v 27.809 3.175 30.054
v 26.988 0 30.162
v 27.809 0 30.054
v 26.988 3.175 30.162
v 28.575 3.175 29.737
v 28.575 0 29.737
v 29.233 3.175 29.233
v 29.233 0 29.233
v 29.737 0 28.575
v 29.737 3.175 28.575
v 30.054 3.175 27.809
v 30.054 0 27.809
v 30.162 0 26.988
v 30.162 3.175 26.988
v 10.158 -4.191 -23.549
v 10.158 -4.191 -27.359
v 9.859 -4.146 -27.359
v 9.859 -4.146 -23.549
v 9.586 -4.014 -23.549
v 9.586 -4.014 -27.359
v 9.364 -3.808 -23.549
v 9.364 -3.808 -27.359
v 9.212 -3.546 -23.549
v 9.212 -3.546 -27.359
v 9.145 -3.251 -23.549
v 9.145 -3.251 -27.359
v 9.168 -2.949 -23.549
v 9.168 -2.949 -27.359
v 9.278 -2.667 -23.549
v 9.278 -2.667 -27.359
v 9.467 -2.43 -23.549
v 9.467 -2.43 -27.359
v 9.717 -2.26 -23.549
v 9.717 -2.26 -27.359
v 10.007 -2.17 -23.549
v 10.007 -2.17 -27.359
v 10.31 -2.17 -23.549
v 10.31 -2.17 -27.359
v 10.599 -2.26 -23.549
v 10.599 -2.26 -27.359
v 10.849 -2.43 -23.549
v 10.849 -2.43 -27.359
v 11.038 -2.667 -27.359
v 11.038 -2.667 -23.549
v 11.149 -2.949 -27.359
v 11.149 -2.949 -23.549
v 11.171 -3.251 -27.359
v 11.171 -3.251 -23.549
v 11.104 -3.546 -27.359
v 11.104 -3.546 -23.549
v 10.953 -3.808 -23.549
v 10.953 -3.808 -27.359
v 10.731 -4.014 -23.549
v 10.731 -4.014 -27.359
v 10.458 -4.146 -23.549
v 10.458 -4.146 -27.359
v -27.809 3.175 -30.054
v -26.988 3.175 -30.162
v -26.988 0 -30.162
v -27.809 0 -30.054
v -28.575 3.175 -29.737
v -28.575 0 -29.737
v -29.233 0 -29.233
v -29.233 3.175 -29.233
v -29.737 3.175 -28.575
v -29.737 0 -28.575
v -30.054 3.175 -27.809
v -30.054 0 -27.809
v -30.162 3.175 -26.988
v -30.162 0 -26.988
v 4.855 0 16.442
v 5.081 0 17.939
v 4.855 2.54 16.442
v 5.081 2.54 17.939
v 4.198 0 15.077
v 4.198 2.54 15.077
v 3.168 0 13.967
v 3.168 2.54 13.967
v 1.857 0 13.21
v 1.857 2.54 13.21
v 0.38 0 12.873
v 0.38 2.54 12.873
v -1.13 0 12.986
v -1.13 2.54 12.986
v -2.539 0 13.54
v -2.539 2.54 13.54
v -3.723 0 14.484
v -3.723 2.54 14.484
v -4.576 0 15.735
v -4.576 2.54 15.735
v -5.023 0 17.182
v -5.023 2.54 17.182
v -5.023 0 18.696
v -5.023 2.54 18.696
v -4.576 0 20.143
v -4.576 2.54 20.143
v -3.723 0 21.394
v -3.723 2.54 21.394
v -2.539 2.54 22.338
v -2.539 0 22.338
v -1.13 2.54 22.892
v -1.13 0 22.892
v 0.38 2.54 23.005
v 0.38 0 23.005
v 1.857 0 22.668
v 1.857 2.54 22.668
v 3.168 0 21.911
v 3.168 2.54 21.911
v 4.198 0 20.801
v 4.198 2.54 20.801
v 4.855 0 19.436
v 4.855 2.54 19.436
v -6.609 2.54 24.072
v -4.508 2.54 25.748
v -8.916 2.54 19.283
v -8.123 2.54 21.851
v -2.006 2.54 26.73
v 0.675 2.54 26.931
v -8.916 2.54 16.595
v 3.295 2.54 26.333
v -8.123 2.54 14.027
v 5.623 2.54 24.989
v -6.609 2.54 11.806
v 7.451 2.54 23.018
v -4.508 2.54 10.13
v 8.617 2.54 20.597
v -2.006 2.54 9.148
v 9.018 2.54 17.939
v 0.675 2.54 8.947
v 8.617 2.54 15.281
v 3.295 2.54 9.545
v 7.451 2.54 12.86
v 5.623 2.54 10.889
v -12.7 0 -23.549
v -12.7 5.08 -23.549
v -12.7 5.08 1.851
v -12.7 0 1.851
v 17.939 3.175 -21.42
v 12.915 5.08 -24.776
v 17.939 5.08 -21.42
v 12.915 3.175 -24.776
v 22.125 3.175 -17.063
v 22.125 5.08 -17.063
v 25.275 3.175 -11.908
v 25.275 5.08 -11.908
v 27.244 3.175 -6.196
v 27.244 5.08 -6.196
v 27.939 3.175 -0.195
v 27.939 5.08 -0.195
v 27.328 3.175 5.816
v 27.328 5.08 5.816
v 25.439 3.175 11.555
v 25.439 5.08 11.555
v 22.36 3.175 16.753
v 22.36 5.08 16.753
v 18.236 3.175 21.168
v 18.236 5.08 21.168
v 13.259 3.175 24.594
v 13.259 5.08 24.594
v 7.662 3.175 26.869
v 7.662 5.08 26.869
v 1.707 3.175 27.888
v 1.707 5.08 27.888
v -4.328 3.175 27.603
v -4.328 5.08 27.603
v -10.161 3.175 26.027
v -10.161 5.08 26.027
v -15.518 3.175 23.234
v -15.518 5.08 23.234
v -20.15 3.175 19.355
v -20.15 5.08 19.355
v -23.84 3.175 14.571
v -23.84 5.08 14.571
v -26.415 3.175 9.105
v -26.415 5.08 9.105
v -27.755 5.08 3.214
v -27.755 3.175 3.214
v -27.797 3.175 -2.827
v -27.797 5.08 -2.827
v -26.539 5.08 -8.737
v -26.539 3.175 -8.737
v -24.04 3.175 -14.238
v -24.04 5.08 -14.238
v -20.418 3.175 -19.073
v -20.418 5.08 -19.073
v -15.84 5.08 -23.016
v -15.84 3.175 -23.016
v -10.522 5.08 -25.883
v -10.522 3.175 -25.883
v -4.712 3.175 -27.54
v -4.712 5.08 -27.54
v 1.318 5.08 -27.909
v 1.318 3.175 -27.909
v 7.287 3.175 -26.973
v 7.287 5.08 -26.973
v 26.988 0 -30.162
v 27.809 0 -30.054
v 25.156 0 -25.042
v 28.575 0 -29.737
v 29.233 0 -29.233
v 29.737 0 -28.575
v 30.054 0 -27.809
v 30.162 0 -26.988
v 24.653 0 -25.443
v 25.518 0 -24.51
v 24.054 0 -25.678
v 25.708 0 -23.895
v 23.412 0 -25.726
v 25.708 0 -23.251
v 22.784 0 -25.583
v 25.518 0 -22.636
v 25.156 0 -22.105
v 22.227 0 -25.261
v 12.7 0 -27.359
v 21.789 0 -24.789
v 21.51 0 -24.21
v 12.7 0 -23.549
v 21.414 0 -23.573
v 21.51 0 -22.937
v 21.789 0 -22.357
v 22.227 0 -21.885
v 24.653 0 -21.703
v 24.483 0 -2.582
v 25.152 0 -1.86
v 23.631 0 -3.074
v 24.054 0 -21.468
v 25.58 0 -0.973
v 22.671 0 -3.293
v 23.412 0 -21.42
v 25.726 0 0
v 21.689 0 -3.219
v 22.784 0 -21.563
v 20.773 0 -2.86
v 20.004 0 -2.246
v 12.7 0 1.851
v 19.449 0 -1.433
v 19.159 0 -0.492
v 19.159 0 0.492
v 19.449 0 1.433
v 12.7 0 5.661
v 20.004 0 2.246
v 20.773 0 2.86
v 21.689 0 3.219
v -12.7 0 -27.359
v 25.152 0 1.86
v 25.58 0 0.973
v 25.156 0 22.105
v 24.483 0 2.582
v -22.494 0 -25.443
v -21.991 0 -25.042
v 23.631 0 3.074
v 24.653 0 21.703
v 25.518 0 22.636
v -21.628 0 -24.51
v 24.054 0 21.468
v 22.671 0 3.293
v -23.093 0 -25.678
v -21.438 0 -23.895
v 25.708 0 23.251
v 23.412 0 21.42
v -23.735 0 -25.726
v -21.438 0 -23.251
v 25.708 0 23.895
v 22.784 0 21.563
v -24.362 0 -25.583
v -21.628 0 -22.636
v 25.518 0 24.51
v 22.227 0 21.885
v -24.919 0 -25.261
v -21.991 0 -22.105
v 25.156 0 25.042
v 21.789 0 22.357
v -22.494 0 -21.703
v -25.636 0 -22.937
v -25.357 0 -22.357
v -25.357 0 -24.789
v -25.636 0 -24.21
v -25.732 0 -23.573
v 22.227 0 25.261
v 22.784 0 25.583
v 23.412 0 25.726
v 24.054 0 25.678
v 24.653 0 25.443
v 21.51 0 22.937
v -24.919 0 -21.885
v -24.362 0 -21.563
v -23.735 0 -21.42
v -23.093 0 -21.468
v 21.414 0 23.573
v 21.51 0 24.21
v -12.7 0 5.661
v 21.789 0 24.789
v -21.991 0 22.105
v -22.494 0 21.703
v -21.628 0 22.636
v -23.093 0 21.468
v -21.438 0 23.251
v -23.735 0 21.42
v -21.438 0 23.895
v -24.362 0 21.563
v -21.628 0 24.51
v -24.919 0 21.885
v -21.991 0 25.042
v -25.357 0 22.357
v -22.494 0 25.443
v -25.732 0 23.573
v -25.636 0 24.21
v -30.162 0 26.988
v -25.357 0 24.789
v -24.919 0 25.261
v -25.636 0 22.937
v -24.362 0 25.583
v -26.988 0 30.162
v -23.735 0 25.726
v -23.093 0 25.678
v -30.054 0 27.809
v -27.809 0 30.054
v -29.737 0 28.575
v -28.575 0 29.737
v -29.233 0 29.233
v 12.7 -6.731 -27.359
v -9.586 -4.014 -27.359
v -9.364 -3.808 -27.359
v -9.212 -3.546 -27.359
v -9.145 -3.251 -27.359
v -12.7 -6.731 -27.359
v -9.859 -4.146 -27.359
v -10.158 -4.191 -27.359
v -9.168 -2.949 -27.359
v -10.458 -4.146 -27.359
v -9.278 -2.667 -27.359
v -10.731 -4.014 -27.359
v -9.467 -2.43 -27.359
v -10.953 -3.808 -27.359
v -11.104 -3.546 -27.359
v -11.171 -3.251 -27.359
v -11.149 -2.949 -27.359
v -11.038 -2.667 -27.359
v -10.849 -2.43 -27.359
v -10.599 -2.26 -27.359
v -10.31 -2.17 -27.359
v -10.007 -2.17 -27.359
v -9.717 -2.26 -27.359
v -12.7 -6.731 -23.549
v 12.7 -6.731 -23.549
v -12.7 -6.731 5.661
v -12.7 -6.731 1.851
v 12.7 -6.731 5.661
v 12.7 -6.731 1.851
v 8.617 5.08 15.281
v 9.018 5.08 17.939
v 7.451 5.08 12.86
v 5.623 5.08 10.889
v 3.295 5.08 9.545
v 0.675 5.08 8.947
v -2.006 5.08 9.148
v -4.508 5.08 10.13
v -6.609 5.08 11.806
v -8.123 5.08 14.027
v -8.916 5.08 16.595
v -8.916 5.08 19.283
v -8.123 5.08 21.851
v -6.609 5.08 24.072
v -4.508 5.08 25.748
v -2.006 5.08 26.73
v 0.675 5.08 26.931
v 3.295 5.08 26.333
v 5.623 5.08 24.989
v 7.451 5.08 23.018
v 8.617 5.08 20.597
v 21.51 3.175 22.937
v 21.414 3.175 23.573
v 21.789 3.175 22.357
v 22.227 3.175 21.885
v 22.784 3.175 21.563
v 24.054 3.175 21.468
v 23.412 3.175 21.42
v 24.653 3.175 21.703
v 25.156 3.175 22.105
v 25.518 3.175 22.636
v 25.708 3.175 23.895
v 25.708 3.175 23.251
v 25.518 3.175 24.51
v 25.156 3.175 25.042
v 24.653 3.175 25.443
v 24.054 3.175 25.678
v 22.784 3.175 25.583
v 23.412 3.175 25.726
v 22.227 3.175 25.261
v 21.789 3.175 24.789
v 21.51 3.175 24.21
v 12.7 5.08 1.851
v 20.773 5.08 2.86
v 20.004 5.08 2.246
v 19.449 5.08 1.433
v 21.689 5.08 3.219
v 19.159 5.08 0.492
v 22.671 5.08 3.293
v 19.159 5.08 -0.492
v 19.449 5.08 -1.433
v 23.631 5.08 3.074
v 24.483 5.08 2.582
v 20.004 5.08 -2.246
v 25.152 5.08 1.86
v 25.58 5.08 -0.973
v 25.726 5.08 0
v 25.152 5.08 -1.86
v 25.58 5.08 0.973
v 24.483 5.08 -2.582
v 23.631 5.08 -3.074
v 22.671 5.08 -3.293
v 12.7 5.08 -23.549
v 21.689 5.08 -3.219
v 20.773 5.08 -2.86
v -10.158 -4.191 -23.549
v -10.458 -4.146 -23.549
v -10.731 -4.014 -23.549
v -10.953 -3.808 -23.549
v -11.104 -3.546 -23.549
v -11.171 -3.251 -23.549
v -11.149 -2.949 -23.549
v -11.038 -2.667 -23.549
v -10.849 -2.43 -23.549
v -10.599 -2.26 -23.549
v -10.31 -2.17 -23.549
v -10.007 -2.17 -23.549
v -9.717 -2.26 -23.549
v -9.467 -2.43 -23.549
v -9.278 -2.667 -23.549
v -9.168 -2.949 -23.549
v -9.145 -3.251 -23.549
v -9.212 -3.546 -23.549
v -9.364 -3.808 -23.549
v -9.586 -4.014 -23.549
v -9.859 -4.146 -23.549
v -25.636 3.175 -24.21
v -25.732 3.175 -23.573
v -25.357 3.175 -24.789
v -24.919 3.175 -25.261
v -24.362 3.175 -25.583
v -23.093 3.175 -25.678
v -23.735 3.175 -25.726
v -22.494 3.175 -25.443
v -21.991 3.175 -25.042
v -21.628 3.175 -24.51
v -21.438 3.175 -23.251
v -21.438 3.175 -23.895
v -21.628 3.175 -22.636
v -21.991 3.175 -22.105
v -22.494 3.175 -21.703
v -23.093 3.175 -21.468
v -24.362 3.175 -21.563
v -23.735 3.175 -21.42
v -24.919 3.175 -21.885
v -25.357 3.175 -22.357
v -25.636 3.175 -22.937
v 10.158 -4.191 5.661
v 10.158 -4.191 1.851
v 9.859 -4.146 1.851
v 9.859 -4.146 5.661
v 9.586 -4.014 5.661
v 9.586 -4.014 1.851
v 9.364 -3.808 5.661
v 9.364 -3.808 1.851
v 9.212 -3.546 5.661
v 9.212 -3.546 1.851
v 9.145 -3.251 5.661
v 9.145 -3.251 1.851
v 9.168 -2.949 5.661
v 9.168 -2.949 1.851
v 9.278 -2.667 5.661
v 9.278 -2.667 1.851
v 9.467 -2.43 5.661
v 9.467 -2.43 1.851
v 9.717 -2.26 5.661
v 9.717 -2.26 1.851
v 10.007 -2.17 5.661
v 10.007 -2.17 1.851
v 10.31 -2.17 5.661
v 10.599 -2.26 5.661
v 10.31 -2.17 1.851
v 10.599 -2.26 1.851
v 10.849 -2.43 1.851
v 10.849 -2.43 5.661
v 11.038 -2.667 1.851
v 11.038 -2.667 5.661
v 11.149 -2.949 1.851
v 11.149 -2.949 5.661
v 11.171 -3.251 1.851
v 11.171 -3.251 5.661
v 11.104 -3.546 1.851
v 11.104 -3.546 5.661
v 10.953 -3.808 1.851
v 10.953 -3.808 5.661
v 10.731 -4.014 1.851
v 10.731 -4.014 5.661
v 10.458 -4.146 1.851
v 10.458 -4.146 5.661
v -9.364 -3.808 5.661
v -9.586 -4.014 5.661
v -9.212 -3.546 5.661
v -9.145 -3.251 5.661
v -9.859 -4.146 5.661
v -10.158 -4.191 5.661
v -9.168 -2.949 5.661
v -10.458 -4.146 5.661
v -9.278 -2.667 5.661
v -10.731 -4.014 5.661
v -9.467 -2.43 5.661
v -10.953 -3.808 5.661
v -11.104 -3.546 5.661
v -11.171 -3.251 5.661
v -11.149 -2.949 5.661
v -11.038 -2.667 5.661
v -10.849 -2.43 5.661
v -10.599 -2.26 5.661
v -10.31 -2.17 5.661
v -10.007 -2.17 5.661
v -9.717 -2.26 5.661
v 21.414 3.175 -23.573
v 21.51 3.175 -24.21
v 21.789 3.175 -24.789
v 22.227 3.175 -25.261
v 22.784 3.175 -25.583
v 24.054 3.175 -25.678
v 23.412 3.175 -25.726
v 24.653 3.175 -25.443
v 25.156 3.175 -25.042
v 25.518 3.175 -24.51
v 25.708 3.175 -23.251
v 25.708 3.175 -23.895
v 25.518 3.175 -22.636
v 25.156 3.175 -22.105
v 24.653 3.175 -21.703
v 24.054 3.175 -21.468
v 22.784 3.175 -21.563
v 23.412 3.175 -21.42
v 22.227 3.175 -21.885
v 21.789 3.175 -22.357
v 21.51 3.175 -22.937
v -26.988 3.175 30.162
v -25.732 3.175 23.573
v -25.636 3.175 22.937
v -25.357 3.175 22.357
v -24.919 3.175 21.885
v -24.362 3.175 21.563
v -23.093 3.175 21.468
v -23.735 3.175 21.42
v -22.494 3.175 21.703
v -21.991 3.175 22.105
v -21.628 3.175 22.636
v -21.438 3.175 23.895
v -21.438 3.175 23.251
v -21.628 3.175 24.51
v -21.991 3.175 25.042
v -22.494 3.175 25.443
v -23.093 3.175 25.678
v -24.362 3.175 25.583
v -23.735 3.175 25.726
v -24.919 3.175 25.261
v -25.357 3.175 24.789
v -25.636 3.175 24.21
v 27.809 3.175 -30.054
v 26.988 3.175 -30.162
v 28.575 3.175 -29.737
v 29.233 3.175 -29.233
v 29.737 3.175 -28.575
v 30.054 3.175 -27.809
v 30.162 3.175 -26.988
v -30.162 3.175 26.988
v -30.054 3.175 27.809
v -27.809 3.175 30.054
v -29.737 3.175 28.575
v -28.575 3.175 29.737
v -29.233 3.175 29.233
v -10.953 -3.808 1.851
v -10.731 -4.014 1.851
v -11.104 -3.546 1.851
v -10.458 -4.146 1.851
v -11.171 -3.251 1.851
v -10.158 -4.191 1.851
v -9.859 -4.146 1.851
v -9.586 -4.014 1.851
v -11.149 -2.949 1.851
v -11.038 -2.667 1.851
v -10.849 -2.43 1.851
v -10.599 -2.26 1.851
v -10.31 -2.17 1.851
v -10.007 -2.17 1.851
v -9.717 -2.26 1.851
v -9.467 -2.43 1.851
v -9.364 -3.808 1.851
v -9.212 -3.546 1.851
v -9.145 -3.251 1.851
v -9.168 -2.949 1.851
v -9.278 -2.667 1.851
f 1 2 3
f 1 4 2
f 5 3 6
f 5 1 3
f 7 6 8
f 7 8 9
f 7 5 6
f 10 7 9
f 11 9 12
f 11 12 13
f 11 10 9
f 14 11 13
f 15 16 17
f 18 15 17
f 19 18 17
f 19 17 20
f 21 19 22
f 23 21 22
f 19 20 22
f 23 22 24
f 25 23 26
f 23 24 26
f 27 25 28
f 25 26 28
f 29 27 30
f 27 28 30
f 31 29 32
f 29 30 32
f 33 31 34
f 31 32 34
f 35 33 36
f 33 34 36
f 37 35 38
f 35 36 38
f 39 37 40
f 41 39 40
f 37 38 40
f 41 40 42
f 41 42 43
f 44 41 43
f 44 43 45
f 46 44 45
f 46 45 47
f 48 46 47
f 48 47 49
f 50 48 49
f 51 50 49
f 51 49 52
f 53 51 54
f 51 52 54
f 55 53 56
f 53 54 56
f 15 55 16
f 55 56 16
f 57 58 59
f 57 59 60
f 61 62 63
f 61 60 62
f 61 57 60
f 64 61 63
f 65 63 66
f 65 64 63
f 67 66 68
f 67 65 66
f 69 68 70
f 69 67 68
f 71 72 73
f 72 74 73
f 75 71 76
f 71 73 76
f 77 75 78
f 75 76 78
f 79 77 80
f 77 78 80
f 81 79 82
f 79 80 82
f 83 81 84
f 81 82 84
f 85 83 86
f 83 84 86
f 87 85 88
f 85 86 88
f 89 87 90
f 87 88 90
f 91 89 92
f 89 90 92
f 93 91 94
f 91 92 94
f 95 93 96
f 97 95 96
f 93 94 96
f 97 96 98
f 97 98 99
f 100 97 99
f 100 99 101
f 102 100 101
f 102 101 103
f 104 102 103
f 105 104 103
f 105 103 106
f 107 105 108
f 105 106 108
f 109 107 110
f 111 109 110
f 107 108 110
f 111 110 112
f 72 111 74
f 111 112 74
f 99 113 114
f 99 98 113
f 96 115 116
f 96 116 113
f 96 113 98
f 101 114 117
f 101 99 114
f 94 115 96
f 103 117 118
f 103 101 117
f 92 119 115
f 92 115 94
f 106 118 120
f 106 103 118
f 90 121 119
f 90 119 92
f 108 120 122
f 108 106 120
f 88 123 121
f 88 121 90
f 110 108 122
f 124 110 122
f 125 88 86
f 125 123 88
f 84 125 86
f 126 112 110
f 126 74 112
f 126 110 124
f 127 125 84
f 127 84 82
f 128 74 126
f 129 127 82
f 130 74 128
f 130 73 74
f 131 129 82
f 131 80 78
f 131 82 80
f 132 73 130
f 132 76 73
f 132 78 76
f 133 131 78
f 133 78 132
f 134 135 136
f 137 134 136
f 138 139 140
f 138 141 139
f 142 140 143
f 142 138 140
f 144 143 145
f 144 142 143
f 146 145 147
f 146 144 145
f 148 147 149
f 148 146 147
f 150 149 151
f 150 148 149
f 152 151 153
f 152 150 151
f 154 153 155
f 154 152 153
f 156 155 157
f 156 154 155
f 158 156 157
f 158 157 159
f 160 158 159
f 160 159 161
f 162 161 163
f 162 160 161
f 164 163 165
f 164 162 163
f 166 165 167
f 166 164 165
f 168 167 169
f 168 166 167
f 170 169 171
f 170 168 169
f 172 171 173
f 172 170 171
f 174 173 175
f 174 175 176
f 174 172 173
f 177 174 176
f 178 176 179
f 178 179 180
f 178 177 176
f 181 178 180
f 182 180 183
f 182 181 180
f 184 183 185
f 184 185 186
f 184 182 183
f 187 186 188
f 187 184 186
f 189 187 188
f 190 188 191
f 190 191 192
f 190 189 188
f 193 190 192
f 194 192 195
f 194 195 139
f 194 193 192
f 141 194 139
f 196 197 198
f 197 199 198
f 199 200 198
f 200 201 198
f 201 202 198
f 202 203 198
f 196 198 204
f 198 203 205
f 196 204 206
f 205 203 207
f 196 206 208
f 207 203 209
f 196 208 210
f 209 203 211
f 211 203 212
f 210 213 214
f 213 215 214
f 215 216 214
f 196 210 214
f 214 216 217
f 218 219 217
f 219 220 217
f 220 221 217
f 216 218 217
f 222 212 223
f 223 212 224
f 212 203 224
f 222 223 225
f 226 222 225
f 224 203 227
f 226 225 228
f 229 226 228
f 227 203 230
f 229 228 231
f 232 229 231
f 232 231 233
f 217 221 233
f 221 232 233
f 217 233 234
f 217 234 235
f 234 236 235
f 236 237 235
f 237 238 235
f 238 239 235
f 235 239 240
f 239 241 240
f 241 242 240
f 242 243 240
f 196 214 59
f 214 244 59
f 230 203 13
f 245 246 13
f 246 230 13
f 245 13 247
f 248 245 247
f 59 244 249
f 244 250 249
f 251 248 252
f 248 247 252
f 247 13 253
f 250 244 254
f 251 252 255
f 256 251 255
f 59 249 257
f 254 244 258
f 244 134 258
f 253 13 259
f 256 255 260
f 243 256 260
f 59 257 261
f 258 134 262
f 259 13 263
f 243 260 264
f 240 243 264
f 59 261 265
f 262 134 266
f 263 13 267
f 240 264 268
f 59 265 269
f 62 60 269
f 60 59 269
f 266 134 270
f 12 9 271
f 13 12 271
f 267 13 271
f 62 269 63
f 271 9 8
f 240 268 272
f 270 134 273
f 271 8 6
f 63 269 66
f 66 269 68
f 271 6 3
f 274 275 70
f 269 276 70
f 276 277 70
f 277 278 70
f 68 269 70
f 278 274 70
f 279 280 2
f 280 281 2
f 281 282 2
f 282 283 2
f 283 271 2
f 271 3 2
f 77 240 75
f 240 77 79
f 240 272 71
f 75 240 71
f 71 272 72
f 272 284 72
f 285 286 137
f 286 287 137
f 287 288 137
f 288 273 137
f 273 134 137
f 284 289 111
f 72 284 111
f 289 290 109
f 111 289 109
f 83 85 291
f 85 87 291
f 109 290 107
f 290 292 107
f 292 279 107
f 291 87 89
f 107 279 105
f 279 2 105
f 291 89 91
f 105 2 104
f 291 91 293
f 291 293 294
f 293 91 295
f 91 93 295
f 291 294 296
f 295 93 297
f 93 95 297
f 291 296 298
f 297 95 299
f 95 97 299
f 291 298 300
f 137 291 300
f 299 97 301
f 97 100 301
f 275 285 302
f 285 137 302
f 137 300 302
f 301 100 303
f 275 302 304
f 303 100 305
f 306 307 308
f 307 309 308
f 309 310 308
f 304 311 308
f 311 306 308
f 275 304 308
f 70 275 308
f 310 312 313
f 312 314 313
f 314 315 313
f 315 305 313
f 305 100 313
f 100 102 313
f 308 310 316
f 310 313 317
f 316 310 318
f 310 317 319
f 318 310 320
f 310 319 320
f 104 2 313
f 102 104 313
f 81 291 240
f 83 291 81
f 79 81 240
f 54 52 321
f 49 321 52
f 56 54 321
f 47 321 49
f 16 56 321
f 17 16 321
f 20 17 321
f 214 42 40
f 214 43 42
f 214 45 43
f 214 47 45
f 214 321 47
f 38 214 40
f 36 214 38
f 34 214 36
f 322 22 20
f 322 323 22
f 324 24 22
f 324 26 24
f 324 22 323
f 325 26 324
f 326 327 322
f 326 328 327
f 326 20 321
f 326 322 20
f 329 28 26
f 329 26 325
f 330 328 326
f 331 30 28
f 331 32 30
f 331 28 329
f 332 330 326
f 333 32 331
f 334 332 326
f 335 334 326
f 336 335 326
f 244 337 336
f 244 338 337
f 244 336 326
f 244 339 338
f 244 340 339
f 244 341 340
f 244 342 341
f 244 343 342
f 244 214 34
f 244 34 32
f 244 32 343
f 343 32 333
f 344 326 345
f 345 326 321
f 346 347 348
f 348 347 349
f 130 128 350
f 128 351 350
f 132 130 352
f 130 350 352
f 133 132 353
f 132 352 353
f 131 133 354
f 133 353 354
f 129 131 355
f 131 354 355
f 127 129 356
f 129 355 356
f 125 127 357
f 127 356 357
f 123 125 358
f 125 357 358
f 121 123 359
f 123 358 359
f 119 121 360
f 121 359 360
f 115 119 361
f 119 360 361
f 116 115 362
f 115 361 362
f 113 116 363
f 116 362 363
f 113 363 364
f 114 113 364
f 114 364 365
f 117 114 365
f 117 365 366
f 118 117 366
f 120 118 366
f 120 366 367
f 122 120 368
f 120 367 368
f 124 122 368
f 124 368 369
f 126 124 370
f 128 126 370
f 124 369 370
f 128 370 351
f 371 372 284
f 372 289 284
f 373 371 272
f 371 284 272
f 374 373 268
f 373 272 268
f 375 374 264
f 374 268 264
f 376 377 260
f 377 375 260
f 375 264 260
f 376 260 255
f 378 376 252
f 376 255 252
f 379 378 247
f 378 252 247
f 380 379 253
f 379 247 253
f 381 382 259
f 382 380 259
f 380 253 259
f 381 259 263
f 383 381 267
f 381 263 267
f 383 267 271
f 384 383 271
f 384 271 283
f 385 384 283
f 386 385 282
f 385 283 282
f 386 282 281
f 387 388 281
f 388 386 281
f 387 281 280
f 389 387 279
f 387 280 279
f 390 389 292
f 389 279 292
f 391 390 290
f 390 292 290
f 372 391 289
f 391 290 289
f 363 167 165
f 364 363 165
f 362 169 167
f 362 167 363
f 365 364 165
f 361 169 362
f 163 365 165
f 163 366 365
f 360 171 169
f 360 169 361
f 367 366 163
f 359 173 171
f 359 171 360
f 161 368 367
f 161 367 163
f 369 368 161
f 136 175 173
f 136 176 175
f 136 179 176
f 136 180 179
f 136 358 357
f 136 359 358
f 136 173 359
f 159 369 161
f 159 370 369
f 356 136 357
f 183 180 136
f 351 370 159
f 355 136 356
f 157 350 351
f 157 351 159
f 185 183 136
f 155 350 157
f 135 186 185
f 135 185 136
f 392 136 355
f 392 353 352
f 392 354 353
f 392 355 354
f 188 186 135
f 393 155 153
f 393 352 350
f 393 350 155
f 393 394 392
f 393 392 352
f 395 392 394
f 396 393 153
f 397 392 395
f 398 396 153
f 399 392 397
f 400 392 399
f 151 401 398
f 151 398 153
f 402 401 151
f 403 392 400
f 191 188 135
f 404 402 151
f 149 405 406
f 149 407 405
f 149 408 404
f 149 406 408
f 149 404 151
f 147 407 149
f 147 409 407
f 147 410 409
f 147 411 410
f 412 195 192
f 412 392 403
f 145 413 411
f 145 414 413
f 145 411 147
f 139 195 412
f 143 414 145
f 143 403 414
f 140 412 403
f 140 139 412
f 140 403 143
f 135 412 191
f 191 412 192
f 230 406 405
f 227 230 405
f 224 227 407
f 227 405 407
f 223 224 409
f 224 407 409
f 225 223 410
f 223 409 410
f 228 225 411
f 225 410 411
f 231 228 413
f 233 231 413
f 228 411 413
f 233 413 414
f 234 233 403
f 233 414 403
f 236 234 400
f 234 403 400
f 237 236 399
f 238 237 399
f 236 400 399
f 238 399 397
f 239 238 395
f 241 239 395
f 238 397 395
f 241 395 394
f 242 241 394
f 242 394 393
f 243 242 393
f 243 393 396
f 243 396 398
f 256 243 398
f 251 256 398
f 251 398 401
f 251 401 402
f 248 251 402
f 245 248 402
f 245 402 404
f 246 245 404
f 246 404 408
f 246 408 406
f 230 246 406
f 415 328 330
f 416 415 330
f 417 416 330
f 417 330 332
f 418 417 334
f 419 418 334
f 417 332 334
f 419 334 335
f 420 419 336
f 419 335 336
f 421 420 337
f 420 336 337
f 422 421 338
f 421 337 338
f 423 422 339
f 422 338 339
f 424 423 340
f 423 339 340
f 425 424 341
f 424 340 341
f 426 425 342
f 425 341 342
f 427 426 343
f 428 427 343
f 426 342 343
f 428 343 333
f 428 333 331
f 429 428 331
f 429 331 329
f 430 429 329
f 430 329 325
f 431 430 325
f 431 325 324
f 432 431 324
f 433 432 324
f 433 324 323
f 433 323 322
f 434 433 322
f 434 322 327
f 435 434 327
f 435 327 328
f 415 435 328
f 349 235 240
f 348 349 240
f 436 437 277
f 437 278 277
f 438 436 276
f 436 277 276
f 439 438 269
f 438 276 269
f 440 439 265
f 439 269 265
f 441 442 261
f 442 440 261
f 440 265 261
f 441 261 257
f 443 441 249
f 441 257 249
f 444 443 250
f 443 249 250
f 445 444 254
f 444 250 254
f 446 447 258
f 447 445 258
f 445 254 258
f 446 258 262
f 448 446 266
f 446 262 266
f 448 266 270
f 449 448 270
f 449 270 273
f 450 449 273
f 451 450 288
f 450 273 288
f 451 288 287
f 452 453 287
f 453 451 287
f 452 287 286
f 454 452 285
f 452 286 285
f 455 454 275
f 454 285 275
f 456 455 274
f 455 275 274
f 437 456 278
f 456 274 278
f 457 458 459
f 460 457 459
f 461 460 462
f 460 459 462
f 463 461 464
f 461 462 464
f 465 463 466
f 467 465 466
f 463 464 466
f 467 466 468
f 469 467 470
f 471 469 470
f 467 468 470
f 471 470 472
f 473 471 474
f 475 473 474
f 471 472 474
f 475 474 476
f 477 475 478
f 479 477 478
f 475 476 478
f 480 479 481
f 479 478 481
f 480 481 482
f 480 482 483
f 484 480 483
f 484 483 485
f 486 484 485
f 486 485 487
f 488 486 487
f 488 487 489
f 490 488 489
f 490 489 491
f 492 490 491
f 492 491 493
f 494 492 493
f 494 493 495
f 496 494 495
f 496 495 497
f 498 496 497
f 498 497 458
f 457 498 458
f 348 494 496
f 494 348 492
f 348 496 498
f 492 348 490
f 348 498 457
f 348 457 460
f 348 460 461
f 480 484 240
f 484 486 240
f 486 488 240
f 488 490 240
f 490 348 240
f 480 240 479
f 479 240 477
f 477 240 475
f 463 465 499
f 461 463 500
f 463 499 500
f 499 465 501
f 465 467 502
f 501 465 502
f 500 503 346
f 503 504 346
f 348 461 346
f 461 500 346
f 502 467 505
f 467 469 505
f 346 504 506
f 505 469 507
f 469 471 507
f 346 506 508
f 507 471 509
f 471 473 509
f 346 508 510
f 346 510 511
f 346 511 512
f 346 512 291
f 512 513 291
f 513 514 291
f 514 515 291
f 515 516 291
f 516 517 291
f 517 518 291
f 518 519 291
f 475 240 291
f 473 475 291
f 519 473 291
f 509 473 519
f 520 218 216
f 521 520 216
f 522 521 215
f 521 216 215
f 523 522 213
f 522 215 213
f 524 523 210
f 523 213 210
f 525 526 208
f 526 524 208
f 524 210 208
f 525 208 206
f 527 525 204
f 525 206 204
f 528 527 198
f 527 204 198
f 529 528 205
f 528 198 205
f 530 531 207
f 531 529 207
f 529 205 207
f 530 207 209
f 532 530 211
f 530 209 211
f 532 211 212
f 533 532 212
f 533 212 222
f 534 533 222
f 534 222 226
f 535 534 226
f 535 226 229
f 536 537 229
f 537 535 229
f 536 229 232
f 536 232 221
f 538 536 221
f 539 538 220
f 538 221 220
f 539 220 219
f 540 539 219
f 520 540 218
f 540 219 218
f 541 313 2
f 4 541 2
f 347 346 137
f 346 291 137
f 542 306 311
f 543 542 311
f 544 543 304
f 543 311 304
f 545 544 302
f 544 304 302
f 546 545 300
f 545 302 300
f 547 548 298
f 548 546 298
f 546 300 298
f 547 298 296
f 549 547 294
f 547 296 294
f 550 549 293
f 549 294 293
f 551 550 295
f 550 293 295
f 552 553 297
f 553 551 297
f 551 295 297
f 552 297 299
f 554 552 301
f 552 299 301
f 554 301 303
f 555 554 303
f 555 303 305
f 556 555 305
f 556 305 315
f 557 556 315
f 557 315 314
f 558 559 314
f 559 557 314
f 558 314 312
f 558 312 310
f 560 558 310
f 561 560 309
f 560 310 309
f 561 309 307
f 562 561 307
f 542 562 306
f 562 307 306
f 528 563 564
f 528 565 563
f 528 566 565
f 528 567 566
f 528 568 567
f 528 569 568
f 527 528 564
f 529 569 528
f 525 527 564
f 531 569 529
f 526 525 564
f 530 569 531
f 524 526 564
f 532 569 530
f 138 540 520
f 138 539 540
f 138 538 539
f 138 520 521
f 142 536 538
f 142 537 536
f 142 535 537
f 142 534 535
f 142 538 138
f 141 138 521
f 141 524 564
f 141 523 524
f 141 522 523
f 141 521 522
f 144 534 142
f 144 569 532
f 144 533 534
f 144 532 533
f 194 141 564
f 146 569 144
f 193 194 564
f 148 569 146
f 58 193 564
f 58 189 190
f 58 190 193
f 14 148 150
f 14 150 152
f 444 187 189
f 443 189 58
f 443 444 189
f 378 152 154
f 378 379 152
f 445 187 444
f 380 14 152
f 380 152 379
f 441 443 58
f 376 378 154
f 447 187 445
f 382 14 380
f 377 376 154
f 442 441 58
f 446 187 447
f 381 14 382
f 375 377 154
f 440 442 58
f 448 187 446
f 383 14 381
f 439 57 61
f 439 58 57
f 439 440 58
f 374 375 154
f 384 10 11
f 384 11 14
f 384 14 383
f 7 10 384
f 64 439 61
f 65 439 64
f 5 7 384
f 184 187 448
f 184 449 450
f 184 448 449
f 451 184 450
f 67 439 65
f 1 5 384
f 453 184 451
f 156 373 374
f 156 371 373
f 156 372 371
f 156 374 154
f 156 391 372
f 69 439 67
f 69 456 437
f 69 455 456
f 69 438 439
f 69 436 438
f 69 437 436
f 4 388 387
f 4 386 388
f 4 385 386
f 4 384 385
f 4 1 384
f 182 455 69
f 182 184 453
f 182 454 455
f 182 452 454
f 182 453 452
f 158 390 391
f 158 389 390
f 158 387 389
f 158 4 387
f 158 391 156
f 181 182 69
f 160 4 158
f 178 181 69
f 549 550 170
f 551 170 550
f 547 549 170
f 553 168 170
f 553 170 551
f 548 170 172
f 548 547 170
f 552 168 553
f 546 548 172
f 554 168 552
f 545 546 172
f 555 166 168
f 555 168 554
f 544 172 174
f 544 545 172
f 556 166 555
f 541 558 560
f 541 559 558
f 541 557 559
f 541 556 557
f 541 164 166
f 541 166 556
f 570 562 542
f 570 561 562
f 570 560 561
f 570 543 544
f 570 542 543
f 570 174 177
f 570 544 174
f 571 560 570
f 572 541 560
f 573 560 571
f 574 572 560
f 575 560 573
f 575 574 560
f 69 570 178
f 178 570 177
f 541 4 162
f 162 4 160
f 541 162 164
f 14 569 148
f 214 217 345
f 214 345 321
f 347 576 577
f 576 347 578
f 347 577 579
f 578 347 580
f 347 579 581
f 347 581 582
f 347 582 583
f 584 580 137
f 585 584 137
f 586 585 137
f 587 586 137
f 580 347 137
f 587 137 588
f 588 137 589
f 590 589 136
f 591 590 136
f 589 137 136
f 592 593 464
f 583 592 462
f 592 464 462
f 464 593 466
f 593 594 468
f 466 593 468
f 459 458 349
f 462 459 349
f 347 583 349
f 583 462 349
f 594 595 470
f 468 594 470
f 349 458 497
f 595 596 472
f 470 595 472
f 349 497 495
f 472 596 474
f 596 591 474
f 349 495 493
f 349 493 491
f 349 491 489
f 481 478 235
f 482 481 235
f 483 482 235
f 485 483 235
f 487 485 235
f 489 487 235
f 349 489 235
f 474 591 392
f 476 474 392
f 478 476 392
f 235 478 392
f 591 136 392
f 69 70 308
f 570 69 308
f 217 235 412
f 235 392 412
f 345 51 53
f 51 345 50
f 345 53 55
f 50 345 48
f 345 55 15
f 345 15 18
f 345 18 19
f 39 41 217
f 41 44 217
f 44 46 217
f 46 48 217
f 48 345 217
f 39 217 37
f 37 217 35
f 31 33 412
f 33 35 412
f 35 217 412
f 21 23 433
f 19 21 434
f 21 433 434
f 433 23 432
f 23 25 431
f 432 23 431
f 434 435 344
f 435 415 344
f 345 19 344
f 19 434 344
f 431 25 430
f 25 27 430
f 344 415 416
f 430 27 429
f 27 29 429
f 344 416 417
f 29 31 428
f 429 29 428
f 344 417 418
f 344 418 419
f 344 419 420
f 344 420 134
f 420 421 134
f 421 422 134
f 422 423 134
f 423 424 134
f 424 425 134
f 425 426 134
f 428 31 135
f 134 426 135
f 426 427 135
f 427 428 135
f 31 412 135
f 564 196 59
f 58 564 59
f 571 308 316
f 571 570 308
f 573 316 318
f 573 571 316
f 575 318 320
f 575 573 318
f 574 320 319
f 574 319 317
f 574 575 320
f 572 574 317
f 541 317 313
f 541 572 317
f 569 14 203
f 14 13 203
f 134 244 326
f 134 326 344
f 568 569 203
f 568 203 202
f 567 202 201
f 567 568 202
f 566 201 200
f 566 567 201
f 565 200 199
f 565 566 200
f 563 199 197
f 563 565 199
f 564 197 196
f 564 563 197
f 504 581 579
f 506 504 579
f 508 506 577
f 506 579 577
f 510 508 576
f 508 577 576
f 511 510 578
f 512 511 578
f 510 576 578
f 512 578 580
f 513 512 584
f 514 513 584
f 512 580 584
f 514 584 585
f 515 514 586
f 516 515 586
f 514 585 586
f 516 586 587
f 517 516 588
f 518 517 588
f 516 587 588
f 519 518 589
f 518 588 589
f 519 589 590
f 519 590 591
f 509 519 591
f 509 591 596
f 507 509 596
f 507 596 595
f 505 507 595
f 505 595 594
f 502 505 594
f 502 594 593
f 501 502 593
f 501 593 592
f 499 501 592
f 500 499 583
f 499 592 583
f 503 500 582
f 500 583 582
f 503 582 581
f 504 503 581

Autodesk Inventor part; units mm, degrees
ref_plane "YZ Plane" through (0, 0, 0) normal (1, 0, 0) x (0, 1, 0)
ref_plane "XZ Plane" through (0, 0, 0) normal (0, 1, 0) x (-1, 0, 0)
ref_plane "XY Plane" through (0, 0, 0) normal (0, 0, 1) x (1, 0, 0)
sketch "Sketch1" plane through (0, 0, 0) normal (0, 1, 0) x (-1, 0, 0)
  line L0 (30.1625, 30.1625) -> (-30.1625, 30.1625)
  line L1 (-30.1625, 30.1625) -> (-30.1625, -30.1625)
  line L2 (-30.1625, -30.1625) -> (30.1625, -30.1625)
  line L3 (30.1625, -30.1625) -> (30.1625, 30.1625)
  circle A0 centre (0, 0) radius 33.3375 construction
  circle A1 centre (0, 0) radius 28.575
  line L4 (-30.1625, 30.1625) -> (30.1625, -30.1625) construction
  line L5 (30.1625, 30.1625) -> (-30.1625, -30.1625) construction
  circle A2 centre (23.5732, 23.5732) radius 2.159
  circle A3 centre (23.5732, -23.5732) radius 2.159
  circle A4 centre (-23.5732, 23.5732) radius 2.159
  circle A5 centre (-23.5732, -23.5732) radius 2.159
  point P0 (0, 0)
  point P1 (0, 0)
  dimension "d0" = 60.325
  dimension "d1" = 60.325
  dimension "d2" = 66.675
  dimension "d3" = 57.15
  dimension "d4" = 4.318
  dimension "d5" = 4.318
  dimension "d6" = 4.318
  dimension "d7" = 4.318
extrude "Extrusion1" add sketch "Sketch1" along normal blind 3.175 contours L3 L2 L1 L0 | A1
sketch "Sketch2" plane through (0, 3.175, 0) normal (0, 1, 0) x (1, 0, 0)
  circle A0 centre (0, 0) radius 27.94
  circle A1 centre (0, 0) radius 28.575 construction
  point P0 (0, 0)
  dimension "d10" = 55.88
  dimension "d17" = 57.15
extrude "Extrusion2" add sketch "Sketch2" along normal blind 1.905
fillet "Fillet1" radius 3.175 4 edges at (30.1625, 1.5875, 30.1625) (-30.1625, 1.5875, 30.1625) (30.1625, 1.5875, -30.1625) (-30.1625, 1.5875, -30.1625)
sketch "Sketch3" plane through (0, 5.08, 0) normal (0, 1, 0) x (1, 0, 0)
  line L0 (-12.7, -1.8506) -> (12.7, -1.8506)
  line L1 (12.7, -1.8506) -> (12.7, 23.5494)
  line L2 (12.7, 23.5494) -> (-12.7, 23.5494)
  line L3 (-12.7, 23.5494) -> (-12.7, -1.8506)
  circle A0 centre (0, 0) radius 27.94
  circle A1 centre (0, 0) radius 27.94 construction
  circle A2 centre (0.0007, -17.939) radius 5.08
  line L4 (16.9084, 0) -> (27.94, 0) construction
  circle A3 centre (22.4242, 0) radius 3.302
  circle A4 centre (0.0007, -17.939) radius 9.017
  line L5 (-12.7, 23.5494) -> (12.7, 23.5494)
  line L6 (12.7, 23.5494) -> (12.7, 27.3594)
  line L7 (12.7, 27.3594) -> (-12.7, 27.3594)
  line L8 (-12.7, 27.3594) -> (-12.7, 23.5494)
  line L9 (-12.7, -1.8506) -> (12.7, -1.8506)
  line L10 (12.7, -1.8506) -> (12.7, -5.6606)
  line L11 (12.7, -5.6606) -> (-12.7, -5.6606)
  line L12 (-12.7, -5.6606) -> (-12.7, -1.8506)
  circle A5 centre (0, 0) radius 27.94 construction
  line L13 (9.7799, 26.1725) -> (9.7799, -5.6606) construction
  line L14 (-10.16, 27.3594) -> (-10.16, -5.6606) construction
  circle A6 centre (22.4242, 0) radius 5.08 construction
  line L15 (-18.288, 29.1374) -> (18.288, 29.1374) construction
  line L16 (18.288, 29.1374) -> (18.288, -7.4386) construction
  line L17 (18.288, -7.4386) -> (-18.288, -7.4386) construction
  line L18 (-18.288, -7.4386) -> (-18.288, 29.1374) construction
  line L19 (-18.288, 29.1374) -> (18.288, -7.4386) construction
  line L20 (18.288, 29.1374) -> (-18.288, -7.4386) construction
  line L21 (18.9952, 6.35) -> (25.8532, 6.35) construction
  line L22 (25.8532, 6.35) -> (25.8532, -6.35) construction
  line L23 (25.8532, -6.35) -> (18.9952, -6.35) construction
  line L24 (18.9952, -6.35) -> (18.9952, 6.35) construction
  line L25 (18.9952, 6.35) -> (25.8532, -6.35) construction
  line L26 (25.8532, 6.35) -> (18.9952, -6.35) construction
  circle A7 centre (0.0007, -17.939) radius 9.525 construction
  point P0 (0, 10.8494)
  dimension "d18" = 25.4
  dimension "d19" = 25.4
  dimension "d32" = 10.16
  dimension "d33" = 6.604
  dimension "d34" = 18.034
  dimension "d37" = 3.81
  dimension "d38" = 3.81
  dimension "d48" = 10.16
  dimension "d49" = 36.576
  dimension "d50" = 36.576
  dimension "d51" = 6.858
  dimension "d52" = 12.7
  dimension "d53" = 19.05
extrude "Extrusion4" cut sketch "Sketch3" against normal through all contours L3 L2 L1 L0 | A2 | A3
extrude "Extrusion5" cut sketch "Sketch3" against normal blind 2.54 contours A4
extrude "Extrusion6" add sketch "Sketch3" against normal blind 11.811 separate body contours L0 L10 L11 L12 | L8 A0 L7 L6 L2 | L8 L7 A0 | A0 L7 L6
sketch "Sketch4" plane through (-12.7, 5.08, 5.6606) normal (0, 0, 1) x (1, 0, 0)
  line L0 (25.4, -8.255) -> (0, -8.255) construction
  line L1 (25.4, 0) -> (25.4, -11.811) construction
  line L2 (0, 0) -> (0, -11.811) construction
  point P0 (12.7, -5.08)
  point P1 (2.5418, -8.255)
  point P2 (22.8582, -8.255)
hole "Hole1" at (10.1582, -3.175, 5.6606) at (-10.1582, -3.175, 5.6606) direction (0, 0, -1) diameter 2.032 end through all bodies 2
combine bodies "Combine1" operation type add bodies to combine 1 2
delete faces "Delete1" heal yes whole lump no faces at (10.3555, 4.445, -27.3594) (-8.0109, 4.445, -27.3594) (12.7, 3.81, -26.5352) (-12.7, 3.81, -25.711)
properties part number "icarus-sam-instrument-mount"
